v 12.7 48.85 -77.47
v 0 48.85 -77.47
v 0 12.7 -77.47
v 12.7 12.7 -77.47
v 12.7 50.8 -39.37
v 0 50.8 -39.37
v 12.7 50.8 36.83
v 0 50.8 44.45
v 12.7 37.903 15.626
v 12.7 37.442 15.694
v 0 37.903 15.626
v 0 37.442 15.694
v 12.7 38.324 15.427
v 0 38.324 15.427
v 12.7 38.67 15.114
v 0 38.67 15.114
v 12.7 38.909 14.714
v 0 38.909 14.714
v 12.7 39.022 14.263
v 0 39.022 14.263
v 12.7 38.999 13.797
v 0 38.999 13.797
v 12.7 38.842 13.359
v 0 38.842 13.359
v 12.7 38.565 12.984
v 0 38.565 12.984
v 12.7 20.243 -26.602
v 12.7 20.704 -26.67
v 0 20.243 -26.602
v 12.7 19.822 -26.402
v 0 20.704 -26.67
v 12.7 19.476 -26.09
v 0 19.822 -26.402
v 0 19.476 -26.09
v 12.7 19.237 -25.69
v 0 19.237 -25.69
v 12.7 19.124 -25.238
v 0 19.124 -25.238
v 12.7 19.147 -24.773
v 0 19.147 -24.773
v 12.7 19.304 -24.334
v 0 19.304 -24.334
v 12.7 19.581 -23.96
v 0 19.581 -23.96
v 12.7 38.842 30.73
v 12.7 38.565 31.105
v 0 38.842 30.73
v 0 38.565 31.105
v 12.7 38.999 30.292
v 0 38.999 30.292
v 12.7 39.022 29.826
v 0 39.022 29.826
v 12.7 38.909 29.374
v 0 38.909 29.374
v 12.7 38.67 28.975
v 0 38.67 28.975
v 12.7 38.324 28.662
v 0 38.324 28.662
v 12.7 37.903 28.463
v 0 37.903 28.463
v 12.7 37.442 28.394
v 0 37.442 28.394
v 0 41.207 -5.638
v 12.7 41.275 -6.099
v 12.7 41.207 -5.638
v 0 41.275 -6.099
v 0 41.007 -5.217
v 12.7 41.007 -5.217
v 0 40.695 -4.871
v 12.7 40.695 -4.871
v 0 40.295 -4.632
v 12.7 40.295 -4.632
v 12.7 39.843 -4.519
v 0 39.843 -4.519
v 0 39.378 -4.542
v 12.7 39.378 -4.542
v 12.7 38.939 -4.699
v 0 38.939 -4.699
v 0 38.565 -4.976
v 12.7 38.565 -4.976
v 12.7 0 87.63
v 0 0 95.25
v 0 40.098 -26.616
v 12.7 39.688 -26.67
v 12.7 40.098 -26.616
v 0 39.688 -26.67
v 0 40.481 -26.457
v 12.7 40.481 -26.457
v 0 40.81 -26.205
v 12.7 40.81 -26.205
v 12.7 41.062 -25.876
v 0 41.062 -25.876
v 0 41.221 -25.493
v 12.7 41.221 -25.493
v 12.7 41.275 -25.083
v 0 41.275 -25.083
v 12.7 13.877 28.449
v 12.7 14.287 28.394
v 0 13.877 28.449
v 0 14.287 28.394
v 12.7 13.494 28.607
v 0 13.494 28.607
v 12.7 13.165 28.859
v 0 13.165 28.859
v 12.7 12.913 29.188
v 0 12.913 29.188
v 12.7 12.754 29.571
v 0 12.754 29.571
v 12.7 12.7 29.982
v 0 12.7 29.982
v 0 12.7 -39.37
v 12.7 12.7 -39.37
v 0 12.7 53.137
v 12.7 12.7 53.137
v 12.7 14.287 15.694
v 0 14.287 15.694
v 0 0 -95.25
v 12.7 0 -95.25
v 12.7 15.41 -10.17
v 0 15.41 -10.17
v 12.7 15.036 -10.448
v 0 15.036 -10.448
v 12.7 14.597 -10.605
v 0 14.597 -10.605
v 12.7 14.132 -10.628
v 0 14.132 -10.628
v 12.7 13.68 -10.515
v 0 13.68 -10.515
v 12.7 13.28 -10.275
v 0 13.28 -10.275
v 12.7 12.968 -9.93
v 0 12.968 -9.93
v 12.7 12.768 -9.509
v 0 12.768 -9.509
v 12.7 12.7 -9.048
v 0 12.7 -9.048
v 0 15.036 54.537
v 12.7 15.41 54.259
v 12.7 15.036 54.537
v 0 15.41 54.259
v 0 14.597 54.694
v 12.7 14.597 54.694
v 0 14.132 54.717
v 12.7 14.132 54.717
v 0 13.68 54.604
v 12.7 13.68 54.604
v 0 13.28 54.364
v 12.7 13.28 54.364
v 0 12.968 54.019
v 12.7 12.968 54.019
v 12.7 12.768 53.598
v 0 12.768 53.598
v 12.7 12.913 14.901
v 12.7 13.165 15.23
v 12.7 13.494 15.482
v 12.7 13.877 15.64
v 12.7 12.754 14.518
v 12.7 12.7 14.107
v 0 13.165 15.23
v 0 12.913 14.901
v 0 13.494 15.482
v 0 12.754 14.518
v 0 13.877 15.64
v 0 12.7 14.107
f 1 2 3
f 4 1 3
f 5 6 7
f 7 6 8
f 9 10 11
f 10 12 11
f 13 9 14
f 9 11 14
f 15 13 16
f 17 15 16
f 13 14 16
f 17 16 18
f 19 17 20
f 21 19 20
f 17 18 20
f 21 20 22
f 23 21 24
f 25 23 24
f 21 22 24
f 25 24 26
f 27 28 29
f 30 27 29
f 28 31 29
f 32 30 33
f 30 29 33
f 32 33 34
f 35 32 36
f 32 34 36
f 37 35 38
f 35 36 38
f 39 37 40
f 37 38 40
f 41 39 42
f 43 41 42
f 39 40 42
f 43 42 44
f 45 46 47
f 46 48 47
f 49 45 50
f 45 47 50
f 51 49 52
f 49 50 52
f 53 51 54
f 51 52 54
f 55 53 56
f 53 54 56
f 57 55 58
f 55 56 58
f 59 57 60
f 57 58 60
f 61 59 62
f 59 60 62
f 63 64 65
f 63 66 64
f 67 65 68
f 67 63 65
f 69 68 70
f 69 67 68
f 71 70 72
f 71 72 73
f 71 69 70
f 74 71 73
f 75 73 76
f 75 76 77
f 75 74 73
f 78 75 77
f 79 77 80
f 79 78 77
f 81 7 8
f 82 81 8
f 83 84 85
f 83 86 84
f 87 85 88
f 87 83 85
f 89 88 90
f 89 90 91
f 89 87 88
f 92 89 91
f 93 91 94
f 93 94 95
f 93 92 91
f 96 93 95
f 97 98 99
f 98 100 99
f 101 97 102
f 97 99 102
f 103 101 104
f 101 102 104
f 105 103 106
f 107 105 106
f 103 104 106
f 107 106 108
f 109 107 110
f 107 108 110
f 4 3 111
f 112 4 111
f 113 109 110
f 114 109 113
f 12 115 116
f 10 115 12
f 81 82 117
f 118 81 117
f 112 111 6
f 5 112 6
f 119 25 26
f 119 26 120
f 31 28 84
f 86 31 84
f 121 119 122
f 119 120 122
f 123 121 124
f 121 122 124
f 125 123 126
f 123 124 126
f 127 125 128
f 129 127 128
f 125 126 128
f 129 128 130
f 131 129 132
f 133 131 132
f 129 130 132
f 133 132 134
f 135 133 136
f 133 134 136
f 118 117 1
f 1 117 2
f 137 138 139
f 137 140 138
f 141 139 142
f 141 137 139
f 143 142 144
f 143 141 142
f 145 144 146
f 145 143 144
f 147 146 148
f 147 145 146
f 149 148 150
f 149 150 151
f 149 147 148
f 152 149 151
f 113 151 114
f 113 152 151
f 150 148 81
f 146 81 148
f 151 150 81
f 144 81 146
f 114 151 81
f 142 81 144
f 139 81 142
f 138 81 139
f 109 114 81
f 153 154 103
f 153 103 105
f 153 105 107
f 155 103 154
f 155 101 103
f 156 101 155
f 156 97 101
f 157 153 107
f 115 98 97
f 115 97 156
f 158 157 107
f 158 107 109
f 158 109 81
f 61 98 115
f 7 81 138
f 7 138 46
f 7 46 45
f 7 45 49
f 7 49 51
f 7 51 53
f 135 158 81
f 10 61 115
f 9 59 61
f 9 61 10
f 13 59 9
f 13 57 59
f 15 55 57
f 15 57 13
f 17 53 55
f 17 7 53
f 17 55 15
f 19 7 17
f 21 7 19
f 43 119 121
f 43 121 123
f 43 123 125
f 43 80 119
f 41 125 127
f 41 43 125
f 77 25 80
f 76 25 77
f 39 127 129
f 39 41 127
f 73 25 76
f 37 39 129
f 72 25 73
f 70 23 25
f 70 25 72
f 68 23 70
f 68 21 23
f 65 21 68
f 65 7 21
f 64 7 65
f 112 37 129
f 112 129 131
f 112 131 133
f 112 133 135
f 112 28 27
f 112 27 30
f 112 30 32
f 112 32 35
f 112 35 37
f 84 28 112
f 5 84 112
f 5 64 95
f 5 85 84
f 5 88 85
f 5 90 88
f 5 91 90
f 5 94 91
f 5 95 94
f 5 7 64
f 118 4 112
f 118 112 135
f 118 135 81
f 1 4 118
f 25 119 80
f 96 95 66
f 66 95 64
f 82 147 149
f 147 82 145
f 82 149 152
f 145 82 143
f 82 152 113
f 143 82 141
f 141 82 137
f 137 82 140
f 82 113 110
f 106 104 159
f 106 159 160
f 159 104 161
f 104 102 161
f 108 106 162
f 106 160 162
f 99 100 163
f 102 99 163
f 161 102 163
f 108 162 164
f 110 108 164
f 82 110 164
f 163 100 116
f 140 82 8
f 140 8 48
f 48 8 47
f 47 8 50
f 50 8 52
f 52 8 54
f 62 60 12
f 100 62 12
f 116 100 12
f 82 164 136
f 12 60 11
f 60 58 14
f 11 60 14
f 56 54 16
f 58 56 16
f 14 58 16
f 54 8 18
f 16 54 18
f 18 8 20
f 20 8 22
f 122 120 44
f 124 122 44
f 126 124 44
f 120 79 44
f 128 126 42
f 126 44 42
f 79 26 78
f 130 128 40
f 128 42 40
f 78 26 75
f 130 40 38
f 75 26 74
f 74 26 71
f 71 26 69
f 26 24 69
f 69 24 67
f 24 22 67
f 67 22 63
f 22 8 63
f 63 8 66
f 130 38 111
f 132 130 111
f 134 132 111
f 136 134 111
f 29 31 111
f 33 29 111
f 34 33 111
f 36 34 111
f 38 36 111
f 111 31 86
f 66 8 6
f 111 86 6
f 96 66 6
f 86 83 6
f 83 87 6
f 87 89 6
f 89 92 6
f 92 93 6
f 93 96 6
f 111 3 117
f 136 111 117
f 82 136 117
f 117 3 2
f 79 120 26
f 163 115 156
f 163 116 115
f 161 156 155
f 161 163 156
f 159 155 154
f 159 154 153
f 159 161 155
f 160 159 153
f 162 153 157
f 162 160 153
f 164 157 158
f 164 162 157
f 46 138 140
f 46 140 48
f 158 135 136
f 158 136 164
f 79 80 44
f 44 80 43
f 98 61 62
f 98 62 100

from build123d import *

# Parameters (mm, degrees)
BOSS_EXTRUDE1_DEPTH = 12.7
CUT_EXTRUDE1_DEPTH  = 155.131437711
CUT_EXTRUDE2_REACH  = 110.694
FILLET1_R           = 1.5875


with BuildPart() as part:
    # Sketch1 → Boss-Extrude1 (new body)
    with BuildSketch(Plane(origin=(0, 0, 0), x_dir=(0, 0, -1), z_dir=(1, 0, 0))):
        Polygon((-95.25, 0), (95.25, 0), (77.47, 48.850148518), (77.47, 12.7), (39.37, 12.7), (39.37, 50.8), (-44.45, 50.8), align=None)
    extrude(amount=BOSS_EXTRUDE1_DEPTH)

    # Sketch2 → Cut-Extrude1 (cut, through all, along a direction that is not the sketch's normal)
    with BuildSketch(Plane(origin=(0, 0, 0), x_dir=(-1, 0, 0), z_dir=(0, -1, 0))):
        Polygon((0, -95.25), (-12.7, -95.25), (-12.7, -87.63), align=None)
    extrude(amount=-CUT_EXTRUDE1_DEPTH, dir=(0, -0.7071067811865438, 0.7071067811865512), mode=Mode.SUBTRACT)

    # Sketch4 → Cut-Extrude2 (cut, up to next)
    with BuildSketch(Plane(origin=(12.7, 0, 0), x_dir=(0, 0, -1), z_dir=(1, 0, 0)), mode=Mode.PRIVATE) as cut_extrude2_sk1:
        Polygon((-56.969487758, 12.7), (-28.394487758, 41.275), (-28.394487758, 12.7), align=None)
    cut_extrude2_tool1 = extrude(cut_extrude2_sk1.sketch, amount=-CUT_EXTRUDE2_REACH, mode=Mode.PRIVATE) & part.part
    # Sketch4 → Cut-Extrude2 (cut, up to next)
    with BuildSketch(Plane(origin=(12.7, 0, 0), x_dir=(0, 0, -1), z_dir=(1, 0, 0)), mode=Mode.PRIVATE) as cut_extrude2_sk2:
        Polygon((-15.694487758, 12.7), (-15.694487758, 41.275), (12.880512242, 12.7), align=None)
    cut_extrude2_tool2 = extrude(cut_extrude2_sk2.sketch, amount=-CUT_EXTRUDE2_REACH, mode=Mode.PRIVATE) & part.part
    # Sketch4 → Cut-Extrude2 (cut, up to next)
    with BuildSketch(Plane(origin=(12.7, 0, 0), x_dir=(0, 0, -1), z_dir=(1, 0, 0)), mode=Mode.PRIVATE) as cut_extrude2_sk3:
        Polygon((2.266024484, 41.275), (26.67, 16.871024484), (26.67, 41.275), align=None)
    cut_extrude2_tool3 = extrude(cut_extrude2_sk3.sketch, amount=-CUT_EXTRUDE2_REACH, mode=Mode.PRIVATE) & part.part
    add(cut_extrude2_tool1.solids().sort_by_distance((12.7, 22.225, 37.919488))[0], mode=Mode.SUBTRACT)
    add(cut_extrude2_tool2.solids().sort_by_distance((12.7, 22.225, 6.169488))[0], mode=Mode.SUBTRACT)
    add(cut_extrude2_tool3.solids().sort_by_distance((12.7, 33.140341, -18.535341))[0], mode=Mode.SUBTRACT)

    # Fillet1
    fillet1_edges = [part.edges().sort_by_distance(p)[0] for p in [
        (6.35, 12.7, 28.394487758),
        (6.35, 12.7, 56.969487758),
        (6.35, 41.275, 28.394487758),
        (6.35, 41.275, -2.266024484),
        (6.35, 41.275, -26.67),
        (6.35, 16.871024484, -26.67),
        (6.35, 12.7, -12.880512242),
        (6.35, 12.7, 15.694487758),
        (6.35, 41.275, 15.694487758),
    ]]
    fillet(fillet1_edges, radius=FILLET1_R)


solid = part.part
